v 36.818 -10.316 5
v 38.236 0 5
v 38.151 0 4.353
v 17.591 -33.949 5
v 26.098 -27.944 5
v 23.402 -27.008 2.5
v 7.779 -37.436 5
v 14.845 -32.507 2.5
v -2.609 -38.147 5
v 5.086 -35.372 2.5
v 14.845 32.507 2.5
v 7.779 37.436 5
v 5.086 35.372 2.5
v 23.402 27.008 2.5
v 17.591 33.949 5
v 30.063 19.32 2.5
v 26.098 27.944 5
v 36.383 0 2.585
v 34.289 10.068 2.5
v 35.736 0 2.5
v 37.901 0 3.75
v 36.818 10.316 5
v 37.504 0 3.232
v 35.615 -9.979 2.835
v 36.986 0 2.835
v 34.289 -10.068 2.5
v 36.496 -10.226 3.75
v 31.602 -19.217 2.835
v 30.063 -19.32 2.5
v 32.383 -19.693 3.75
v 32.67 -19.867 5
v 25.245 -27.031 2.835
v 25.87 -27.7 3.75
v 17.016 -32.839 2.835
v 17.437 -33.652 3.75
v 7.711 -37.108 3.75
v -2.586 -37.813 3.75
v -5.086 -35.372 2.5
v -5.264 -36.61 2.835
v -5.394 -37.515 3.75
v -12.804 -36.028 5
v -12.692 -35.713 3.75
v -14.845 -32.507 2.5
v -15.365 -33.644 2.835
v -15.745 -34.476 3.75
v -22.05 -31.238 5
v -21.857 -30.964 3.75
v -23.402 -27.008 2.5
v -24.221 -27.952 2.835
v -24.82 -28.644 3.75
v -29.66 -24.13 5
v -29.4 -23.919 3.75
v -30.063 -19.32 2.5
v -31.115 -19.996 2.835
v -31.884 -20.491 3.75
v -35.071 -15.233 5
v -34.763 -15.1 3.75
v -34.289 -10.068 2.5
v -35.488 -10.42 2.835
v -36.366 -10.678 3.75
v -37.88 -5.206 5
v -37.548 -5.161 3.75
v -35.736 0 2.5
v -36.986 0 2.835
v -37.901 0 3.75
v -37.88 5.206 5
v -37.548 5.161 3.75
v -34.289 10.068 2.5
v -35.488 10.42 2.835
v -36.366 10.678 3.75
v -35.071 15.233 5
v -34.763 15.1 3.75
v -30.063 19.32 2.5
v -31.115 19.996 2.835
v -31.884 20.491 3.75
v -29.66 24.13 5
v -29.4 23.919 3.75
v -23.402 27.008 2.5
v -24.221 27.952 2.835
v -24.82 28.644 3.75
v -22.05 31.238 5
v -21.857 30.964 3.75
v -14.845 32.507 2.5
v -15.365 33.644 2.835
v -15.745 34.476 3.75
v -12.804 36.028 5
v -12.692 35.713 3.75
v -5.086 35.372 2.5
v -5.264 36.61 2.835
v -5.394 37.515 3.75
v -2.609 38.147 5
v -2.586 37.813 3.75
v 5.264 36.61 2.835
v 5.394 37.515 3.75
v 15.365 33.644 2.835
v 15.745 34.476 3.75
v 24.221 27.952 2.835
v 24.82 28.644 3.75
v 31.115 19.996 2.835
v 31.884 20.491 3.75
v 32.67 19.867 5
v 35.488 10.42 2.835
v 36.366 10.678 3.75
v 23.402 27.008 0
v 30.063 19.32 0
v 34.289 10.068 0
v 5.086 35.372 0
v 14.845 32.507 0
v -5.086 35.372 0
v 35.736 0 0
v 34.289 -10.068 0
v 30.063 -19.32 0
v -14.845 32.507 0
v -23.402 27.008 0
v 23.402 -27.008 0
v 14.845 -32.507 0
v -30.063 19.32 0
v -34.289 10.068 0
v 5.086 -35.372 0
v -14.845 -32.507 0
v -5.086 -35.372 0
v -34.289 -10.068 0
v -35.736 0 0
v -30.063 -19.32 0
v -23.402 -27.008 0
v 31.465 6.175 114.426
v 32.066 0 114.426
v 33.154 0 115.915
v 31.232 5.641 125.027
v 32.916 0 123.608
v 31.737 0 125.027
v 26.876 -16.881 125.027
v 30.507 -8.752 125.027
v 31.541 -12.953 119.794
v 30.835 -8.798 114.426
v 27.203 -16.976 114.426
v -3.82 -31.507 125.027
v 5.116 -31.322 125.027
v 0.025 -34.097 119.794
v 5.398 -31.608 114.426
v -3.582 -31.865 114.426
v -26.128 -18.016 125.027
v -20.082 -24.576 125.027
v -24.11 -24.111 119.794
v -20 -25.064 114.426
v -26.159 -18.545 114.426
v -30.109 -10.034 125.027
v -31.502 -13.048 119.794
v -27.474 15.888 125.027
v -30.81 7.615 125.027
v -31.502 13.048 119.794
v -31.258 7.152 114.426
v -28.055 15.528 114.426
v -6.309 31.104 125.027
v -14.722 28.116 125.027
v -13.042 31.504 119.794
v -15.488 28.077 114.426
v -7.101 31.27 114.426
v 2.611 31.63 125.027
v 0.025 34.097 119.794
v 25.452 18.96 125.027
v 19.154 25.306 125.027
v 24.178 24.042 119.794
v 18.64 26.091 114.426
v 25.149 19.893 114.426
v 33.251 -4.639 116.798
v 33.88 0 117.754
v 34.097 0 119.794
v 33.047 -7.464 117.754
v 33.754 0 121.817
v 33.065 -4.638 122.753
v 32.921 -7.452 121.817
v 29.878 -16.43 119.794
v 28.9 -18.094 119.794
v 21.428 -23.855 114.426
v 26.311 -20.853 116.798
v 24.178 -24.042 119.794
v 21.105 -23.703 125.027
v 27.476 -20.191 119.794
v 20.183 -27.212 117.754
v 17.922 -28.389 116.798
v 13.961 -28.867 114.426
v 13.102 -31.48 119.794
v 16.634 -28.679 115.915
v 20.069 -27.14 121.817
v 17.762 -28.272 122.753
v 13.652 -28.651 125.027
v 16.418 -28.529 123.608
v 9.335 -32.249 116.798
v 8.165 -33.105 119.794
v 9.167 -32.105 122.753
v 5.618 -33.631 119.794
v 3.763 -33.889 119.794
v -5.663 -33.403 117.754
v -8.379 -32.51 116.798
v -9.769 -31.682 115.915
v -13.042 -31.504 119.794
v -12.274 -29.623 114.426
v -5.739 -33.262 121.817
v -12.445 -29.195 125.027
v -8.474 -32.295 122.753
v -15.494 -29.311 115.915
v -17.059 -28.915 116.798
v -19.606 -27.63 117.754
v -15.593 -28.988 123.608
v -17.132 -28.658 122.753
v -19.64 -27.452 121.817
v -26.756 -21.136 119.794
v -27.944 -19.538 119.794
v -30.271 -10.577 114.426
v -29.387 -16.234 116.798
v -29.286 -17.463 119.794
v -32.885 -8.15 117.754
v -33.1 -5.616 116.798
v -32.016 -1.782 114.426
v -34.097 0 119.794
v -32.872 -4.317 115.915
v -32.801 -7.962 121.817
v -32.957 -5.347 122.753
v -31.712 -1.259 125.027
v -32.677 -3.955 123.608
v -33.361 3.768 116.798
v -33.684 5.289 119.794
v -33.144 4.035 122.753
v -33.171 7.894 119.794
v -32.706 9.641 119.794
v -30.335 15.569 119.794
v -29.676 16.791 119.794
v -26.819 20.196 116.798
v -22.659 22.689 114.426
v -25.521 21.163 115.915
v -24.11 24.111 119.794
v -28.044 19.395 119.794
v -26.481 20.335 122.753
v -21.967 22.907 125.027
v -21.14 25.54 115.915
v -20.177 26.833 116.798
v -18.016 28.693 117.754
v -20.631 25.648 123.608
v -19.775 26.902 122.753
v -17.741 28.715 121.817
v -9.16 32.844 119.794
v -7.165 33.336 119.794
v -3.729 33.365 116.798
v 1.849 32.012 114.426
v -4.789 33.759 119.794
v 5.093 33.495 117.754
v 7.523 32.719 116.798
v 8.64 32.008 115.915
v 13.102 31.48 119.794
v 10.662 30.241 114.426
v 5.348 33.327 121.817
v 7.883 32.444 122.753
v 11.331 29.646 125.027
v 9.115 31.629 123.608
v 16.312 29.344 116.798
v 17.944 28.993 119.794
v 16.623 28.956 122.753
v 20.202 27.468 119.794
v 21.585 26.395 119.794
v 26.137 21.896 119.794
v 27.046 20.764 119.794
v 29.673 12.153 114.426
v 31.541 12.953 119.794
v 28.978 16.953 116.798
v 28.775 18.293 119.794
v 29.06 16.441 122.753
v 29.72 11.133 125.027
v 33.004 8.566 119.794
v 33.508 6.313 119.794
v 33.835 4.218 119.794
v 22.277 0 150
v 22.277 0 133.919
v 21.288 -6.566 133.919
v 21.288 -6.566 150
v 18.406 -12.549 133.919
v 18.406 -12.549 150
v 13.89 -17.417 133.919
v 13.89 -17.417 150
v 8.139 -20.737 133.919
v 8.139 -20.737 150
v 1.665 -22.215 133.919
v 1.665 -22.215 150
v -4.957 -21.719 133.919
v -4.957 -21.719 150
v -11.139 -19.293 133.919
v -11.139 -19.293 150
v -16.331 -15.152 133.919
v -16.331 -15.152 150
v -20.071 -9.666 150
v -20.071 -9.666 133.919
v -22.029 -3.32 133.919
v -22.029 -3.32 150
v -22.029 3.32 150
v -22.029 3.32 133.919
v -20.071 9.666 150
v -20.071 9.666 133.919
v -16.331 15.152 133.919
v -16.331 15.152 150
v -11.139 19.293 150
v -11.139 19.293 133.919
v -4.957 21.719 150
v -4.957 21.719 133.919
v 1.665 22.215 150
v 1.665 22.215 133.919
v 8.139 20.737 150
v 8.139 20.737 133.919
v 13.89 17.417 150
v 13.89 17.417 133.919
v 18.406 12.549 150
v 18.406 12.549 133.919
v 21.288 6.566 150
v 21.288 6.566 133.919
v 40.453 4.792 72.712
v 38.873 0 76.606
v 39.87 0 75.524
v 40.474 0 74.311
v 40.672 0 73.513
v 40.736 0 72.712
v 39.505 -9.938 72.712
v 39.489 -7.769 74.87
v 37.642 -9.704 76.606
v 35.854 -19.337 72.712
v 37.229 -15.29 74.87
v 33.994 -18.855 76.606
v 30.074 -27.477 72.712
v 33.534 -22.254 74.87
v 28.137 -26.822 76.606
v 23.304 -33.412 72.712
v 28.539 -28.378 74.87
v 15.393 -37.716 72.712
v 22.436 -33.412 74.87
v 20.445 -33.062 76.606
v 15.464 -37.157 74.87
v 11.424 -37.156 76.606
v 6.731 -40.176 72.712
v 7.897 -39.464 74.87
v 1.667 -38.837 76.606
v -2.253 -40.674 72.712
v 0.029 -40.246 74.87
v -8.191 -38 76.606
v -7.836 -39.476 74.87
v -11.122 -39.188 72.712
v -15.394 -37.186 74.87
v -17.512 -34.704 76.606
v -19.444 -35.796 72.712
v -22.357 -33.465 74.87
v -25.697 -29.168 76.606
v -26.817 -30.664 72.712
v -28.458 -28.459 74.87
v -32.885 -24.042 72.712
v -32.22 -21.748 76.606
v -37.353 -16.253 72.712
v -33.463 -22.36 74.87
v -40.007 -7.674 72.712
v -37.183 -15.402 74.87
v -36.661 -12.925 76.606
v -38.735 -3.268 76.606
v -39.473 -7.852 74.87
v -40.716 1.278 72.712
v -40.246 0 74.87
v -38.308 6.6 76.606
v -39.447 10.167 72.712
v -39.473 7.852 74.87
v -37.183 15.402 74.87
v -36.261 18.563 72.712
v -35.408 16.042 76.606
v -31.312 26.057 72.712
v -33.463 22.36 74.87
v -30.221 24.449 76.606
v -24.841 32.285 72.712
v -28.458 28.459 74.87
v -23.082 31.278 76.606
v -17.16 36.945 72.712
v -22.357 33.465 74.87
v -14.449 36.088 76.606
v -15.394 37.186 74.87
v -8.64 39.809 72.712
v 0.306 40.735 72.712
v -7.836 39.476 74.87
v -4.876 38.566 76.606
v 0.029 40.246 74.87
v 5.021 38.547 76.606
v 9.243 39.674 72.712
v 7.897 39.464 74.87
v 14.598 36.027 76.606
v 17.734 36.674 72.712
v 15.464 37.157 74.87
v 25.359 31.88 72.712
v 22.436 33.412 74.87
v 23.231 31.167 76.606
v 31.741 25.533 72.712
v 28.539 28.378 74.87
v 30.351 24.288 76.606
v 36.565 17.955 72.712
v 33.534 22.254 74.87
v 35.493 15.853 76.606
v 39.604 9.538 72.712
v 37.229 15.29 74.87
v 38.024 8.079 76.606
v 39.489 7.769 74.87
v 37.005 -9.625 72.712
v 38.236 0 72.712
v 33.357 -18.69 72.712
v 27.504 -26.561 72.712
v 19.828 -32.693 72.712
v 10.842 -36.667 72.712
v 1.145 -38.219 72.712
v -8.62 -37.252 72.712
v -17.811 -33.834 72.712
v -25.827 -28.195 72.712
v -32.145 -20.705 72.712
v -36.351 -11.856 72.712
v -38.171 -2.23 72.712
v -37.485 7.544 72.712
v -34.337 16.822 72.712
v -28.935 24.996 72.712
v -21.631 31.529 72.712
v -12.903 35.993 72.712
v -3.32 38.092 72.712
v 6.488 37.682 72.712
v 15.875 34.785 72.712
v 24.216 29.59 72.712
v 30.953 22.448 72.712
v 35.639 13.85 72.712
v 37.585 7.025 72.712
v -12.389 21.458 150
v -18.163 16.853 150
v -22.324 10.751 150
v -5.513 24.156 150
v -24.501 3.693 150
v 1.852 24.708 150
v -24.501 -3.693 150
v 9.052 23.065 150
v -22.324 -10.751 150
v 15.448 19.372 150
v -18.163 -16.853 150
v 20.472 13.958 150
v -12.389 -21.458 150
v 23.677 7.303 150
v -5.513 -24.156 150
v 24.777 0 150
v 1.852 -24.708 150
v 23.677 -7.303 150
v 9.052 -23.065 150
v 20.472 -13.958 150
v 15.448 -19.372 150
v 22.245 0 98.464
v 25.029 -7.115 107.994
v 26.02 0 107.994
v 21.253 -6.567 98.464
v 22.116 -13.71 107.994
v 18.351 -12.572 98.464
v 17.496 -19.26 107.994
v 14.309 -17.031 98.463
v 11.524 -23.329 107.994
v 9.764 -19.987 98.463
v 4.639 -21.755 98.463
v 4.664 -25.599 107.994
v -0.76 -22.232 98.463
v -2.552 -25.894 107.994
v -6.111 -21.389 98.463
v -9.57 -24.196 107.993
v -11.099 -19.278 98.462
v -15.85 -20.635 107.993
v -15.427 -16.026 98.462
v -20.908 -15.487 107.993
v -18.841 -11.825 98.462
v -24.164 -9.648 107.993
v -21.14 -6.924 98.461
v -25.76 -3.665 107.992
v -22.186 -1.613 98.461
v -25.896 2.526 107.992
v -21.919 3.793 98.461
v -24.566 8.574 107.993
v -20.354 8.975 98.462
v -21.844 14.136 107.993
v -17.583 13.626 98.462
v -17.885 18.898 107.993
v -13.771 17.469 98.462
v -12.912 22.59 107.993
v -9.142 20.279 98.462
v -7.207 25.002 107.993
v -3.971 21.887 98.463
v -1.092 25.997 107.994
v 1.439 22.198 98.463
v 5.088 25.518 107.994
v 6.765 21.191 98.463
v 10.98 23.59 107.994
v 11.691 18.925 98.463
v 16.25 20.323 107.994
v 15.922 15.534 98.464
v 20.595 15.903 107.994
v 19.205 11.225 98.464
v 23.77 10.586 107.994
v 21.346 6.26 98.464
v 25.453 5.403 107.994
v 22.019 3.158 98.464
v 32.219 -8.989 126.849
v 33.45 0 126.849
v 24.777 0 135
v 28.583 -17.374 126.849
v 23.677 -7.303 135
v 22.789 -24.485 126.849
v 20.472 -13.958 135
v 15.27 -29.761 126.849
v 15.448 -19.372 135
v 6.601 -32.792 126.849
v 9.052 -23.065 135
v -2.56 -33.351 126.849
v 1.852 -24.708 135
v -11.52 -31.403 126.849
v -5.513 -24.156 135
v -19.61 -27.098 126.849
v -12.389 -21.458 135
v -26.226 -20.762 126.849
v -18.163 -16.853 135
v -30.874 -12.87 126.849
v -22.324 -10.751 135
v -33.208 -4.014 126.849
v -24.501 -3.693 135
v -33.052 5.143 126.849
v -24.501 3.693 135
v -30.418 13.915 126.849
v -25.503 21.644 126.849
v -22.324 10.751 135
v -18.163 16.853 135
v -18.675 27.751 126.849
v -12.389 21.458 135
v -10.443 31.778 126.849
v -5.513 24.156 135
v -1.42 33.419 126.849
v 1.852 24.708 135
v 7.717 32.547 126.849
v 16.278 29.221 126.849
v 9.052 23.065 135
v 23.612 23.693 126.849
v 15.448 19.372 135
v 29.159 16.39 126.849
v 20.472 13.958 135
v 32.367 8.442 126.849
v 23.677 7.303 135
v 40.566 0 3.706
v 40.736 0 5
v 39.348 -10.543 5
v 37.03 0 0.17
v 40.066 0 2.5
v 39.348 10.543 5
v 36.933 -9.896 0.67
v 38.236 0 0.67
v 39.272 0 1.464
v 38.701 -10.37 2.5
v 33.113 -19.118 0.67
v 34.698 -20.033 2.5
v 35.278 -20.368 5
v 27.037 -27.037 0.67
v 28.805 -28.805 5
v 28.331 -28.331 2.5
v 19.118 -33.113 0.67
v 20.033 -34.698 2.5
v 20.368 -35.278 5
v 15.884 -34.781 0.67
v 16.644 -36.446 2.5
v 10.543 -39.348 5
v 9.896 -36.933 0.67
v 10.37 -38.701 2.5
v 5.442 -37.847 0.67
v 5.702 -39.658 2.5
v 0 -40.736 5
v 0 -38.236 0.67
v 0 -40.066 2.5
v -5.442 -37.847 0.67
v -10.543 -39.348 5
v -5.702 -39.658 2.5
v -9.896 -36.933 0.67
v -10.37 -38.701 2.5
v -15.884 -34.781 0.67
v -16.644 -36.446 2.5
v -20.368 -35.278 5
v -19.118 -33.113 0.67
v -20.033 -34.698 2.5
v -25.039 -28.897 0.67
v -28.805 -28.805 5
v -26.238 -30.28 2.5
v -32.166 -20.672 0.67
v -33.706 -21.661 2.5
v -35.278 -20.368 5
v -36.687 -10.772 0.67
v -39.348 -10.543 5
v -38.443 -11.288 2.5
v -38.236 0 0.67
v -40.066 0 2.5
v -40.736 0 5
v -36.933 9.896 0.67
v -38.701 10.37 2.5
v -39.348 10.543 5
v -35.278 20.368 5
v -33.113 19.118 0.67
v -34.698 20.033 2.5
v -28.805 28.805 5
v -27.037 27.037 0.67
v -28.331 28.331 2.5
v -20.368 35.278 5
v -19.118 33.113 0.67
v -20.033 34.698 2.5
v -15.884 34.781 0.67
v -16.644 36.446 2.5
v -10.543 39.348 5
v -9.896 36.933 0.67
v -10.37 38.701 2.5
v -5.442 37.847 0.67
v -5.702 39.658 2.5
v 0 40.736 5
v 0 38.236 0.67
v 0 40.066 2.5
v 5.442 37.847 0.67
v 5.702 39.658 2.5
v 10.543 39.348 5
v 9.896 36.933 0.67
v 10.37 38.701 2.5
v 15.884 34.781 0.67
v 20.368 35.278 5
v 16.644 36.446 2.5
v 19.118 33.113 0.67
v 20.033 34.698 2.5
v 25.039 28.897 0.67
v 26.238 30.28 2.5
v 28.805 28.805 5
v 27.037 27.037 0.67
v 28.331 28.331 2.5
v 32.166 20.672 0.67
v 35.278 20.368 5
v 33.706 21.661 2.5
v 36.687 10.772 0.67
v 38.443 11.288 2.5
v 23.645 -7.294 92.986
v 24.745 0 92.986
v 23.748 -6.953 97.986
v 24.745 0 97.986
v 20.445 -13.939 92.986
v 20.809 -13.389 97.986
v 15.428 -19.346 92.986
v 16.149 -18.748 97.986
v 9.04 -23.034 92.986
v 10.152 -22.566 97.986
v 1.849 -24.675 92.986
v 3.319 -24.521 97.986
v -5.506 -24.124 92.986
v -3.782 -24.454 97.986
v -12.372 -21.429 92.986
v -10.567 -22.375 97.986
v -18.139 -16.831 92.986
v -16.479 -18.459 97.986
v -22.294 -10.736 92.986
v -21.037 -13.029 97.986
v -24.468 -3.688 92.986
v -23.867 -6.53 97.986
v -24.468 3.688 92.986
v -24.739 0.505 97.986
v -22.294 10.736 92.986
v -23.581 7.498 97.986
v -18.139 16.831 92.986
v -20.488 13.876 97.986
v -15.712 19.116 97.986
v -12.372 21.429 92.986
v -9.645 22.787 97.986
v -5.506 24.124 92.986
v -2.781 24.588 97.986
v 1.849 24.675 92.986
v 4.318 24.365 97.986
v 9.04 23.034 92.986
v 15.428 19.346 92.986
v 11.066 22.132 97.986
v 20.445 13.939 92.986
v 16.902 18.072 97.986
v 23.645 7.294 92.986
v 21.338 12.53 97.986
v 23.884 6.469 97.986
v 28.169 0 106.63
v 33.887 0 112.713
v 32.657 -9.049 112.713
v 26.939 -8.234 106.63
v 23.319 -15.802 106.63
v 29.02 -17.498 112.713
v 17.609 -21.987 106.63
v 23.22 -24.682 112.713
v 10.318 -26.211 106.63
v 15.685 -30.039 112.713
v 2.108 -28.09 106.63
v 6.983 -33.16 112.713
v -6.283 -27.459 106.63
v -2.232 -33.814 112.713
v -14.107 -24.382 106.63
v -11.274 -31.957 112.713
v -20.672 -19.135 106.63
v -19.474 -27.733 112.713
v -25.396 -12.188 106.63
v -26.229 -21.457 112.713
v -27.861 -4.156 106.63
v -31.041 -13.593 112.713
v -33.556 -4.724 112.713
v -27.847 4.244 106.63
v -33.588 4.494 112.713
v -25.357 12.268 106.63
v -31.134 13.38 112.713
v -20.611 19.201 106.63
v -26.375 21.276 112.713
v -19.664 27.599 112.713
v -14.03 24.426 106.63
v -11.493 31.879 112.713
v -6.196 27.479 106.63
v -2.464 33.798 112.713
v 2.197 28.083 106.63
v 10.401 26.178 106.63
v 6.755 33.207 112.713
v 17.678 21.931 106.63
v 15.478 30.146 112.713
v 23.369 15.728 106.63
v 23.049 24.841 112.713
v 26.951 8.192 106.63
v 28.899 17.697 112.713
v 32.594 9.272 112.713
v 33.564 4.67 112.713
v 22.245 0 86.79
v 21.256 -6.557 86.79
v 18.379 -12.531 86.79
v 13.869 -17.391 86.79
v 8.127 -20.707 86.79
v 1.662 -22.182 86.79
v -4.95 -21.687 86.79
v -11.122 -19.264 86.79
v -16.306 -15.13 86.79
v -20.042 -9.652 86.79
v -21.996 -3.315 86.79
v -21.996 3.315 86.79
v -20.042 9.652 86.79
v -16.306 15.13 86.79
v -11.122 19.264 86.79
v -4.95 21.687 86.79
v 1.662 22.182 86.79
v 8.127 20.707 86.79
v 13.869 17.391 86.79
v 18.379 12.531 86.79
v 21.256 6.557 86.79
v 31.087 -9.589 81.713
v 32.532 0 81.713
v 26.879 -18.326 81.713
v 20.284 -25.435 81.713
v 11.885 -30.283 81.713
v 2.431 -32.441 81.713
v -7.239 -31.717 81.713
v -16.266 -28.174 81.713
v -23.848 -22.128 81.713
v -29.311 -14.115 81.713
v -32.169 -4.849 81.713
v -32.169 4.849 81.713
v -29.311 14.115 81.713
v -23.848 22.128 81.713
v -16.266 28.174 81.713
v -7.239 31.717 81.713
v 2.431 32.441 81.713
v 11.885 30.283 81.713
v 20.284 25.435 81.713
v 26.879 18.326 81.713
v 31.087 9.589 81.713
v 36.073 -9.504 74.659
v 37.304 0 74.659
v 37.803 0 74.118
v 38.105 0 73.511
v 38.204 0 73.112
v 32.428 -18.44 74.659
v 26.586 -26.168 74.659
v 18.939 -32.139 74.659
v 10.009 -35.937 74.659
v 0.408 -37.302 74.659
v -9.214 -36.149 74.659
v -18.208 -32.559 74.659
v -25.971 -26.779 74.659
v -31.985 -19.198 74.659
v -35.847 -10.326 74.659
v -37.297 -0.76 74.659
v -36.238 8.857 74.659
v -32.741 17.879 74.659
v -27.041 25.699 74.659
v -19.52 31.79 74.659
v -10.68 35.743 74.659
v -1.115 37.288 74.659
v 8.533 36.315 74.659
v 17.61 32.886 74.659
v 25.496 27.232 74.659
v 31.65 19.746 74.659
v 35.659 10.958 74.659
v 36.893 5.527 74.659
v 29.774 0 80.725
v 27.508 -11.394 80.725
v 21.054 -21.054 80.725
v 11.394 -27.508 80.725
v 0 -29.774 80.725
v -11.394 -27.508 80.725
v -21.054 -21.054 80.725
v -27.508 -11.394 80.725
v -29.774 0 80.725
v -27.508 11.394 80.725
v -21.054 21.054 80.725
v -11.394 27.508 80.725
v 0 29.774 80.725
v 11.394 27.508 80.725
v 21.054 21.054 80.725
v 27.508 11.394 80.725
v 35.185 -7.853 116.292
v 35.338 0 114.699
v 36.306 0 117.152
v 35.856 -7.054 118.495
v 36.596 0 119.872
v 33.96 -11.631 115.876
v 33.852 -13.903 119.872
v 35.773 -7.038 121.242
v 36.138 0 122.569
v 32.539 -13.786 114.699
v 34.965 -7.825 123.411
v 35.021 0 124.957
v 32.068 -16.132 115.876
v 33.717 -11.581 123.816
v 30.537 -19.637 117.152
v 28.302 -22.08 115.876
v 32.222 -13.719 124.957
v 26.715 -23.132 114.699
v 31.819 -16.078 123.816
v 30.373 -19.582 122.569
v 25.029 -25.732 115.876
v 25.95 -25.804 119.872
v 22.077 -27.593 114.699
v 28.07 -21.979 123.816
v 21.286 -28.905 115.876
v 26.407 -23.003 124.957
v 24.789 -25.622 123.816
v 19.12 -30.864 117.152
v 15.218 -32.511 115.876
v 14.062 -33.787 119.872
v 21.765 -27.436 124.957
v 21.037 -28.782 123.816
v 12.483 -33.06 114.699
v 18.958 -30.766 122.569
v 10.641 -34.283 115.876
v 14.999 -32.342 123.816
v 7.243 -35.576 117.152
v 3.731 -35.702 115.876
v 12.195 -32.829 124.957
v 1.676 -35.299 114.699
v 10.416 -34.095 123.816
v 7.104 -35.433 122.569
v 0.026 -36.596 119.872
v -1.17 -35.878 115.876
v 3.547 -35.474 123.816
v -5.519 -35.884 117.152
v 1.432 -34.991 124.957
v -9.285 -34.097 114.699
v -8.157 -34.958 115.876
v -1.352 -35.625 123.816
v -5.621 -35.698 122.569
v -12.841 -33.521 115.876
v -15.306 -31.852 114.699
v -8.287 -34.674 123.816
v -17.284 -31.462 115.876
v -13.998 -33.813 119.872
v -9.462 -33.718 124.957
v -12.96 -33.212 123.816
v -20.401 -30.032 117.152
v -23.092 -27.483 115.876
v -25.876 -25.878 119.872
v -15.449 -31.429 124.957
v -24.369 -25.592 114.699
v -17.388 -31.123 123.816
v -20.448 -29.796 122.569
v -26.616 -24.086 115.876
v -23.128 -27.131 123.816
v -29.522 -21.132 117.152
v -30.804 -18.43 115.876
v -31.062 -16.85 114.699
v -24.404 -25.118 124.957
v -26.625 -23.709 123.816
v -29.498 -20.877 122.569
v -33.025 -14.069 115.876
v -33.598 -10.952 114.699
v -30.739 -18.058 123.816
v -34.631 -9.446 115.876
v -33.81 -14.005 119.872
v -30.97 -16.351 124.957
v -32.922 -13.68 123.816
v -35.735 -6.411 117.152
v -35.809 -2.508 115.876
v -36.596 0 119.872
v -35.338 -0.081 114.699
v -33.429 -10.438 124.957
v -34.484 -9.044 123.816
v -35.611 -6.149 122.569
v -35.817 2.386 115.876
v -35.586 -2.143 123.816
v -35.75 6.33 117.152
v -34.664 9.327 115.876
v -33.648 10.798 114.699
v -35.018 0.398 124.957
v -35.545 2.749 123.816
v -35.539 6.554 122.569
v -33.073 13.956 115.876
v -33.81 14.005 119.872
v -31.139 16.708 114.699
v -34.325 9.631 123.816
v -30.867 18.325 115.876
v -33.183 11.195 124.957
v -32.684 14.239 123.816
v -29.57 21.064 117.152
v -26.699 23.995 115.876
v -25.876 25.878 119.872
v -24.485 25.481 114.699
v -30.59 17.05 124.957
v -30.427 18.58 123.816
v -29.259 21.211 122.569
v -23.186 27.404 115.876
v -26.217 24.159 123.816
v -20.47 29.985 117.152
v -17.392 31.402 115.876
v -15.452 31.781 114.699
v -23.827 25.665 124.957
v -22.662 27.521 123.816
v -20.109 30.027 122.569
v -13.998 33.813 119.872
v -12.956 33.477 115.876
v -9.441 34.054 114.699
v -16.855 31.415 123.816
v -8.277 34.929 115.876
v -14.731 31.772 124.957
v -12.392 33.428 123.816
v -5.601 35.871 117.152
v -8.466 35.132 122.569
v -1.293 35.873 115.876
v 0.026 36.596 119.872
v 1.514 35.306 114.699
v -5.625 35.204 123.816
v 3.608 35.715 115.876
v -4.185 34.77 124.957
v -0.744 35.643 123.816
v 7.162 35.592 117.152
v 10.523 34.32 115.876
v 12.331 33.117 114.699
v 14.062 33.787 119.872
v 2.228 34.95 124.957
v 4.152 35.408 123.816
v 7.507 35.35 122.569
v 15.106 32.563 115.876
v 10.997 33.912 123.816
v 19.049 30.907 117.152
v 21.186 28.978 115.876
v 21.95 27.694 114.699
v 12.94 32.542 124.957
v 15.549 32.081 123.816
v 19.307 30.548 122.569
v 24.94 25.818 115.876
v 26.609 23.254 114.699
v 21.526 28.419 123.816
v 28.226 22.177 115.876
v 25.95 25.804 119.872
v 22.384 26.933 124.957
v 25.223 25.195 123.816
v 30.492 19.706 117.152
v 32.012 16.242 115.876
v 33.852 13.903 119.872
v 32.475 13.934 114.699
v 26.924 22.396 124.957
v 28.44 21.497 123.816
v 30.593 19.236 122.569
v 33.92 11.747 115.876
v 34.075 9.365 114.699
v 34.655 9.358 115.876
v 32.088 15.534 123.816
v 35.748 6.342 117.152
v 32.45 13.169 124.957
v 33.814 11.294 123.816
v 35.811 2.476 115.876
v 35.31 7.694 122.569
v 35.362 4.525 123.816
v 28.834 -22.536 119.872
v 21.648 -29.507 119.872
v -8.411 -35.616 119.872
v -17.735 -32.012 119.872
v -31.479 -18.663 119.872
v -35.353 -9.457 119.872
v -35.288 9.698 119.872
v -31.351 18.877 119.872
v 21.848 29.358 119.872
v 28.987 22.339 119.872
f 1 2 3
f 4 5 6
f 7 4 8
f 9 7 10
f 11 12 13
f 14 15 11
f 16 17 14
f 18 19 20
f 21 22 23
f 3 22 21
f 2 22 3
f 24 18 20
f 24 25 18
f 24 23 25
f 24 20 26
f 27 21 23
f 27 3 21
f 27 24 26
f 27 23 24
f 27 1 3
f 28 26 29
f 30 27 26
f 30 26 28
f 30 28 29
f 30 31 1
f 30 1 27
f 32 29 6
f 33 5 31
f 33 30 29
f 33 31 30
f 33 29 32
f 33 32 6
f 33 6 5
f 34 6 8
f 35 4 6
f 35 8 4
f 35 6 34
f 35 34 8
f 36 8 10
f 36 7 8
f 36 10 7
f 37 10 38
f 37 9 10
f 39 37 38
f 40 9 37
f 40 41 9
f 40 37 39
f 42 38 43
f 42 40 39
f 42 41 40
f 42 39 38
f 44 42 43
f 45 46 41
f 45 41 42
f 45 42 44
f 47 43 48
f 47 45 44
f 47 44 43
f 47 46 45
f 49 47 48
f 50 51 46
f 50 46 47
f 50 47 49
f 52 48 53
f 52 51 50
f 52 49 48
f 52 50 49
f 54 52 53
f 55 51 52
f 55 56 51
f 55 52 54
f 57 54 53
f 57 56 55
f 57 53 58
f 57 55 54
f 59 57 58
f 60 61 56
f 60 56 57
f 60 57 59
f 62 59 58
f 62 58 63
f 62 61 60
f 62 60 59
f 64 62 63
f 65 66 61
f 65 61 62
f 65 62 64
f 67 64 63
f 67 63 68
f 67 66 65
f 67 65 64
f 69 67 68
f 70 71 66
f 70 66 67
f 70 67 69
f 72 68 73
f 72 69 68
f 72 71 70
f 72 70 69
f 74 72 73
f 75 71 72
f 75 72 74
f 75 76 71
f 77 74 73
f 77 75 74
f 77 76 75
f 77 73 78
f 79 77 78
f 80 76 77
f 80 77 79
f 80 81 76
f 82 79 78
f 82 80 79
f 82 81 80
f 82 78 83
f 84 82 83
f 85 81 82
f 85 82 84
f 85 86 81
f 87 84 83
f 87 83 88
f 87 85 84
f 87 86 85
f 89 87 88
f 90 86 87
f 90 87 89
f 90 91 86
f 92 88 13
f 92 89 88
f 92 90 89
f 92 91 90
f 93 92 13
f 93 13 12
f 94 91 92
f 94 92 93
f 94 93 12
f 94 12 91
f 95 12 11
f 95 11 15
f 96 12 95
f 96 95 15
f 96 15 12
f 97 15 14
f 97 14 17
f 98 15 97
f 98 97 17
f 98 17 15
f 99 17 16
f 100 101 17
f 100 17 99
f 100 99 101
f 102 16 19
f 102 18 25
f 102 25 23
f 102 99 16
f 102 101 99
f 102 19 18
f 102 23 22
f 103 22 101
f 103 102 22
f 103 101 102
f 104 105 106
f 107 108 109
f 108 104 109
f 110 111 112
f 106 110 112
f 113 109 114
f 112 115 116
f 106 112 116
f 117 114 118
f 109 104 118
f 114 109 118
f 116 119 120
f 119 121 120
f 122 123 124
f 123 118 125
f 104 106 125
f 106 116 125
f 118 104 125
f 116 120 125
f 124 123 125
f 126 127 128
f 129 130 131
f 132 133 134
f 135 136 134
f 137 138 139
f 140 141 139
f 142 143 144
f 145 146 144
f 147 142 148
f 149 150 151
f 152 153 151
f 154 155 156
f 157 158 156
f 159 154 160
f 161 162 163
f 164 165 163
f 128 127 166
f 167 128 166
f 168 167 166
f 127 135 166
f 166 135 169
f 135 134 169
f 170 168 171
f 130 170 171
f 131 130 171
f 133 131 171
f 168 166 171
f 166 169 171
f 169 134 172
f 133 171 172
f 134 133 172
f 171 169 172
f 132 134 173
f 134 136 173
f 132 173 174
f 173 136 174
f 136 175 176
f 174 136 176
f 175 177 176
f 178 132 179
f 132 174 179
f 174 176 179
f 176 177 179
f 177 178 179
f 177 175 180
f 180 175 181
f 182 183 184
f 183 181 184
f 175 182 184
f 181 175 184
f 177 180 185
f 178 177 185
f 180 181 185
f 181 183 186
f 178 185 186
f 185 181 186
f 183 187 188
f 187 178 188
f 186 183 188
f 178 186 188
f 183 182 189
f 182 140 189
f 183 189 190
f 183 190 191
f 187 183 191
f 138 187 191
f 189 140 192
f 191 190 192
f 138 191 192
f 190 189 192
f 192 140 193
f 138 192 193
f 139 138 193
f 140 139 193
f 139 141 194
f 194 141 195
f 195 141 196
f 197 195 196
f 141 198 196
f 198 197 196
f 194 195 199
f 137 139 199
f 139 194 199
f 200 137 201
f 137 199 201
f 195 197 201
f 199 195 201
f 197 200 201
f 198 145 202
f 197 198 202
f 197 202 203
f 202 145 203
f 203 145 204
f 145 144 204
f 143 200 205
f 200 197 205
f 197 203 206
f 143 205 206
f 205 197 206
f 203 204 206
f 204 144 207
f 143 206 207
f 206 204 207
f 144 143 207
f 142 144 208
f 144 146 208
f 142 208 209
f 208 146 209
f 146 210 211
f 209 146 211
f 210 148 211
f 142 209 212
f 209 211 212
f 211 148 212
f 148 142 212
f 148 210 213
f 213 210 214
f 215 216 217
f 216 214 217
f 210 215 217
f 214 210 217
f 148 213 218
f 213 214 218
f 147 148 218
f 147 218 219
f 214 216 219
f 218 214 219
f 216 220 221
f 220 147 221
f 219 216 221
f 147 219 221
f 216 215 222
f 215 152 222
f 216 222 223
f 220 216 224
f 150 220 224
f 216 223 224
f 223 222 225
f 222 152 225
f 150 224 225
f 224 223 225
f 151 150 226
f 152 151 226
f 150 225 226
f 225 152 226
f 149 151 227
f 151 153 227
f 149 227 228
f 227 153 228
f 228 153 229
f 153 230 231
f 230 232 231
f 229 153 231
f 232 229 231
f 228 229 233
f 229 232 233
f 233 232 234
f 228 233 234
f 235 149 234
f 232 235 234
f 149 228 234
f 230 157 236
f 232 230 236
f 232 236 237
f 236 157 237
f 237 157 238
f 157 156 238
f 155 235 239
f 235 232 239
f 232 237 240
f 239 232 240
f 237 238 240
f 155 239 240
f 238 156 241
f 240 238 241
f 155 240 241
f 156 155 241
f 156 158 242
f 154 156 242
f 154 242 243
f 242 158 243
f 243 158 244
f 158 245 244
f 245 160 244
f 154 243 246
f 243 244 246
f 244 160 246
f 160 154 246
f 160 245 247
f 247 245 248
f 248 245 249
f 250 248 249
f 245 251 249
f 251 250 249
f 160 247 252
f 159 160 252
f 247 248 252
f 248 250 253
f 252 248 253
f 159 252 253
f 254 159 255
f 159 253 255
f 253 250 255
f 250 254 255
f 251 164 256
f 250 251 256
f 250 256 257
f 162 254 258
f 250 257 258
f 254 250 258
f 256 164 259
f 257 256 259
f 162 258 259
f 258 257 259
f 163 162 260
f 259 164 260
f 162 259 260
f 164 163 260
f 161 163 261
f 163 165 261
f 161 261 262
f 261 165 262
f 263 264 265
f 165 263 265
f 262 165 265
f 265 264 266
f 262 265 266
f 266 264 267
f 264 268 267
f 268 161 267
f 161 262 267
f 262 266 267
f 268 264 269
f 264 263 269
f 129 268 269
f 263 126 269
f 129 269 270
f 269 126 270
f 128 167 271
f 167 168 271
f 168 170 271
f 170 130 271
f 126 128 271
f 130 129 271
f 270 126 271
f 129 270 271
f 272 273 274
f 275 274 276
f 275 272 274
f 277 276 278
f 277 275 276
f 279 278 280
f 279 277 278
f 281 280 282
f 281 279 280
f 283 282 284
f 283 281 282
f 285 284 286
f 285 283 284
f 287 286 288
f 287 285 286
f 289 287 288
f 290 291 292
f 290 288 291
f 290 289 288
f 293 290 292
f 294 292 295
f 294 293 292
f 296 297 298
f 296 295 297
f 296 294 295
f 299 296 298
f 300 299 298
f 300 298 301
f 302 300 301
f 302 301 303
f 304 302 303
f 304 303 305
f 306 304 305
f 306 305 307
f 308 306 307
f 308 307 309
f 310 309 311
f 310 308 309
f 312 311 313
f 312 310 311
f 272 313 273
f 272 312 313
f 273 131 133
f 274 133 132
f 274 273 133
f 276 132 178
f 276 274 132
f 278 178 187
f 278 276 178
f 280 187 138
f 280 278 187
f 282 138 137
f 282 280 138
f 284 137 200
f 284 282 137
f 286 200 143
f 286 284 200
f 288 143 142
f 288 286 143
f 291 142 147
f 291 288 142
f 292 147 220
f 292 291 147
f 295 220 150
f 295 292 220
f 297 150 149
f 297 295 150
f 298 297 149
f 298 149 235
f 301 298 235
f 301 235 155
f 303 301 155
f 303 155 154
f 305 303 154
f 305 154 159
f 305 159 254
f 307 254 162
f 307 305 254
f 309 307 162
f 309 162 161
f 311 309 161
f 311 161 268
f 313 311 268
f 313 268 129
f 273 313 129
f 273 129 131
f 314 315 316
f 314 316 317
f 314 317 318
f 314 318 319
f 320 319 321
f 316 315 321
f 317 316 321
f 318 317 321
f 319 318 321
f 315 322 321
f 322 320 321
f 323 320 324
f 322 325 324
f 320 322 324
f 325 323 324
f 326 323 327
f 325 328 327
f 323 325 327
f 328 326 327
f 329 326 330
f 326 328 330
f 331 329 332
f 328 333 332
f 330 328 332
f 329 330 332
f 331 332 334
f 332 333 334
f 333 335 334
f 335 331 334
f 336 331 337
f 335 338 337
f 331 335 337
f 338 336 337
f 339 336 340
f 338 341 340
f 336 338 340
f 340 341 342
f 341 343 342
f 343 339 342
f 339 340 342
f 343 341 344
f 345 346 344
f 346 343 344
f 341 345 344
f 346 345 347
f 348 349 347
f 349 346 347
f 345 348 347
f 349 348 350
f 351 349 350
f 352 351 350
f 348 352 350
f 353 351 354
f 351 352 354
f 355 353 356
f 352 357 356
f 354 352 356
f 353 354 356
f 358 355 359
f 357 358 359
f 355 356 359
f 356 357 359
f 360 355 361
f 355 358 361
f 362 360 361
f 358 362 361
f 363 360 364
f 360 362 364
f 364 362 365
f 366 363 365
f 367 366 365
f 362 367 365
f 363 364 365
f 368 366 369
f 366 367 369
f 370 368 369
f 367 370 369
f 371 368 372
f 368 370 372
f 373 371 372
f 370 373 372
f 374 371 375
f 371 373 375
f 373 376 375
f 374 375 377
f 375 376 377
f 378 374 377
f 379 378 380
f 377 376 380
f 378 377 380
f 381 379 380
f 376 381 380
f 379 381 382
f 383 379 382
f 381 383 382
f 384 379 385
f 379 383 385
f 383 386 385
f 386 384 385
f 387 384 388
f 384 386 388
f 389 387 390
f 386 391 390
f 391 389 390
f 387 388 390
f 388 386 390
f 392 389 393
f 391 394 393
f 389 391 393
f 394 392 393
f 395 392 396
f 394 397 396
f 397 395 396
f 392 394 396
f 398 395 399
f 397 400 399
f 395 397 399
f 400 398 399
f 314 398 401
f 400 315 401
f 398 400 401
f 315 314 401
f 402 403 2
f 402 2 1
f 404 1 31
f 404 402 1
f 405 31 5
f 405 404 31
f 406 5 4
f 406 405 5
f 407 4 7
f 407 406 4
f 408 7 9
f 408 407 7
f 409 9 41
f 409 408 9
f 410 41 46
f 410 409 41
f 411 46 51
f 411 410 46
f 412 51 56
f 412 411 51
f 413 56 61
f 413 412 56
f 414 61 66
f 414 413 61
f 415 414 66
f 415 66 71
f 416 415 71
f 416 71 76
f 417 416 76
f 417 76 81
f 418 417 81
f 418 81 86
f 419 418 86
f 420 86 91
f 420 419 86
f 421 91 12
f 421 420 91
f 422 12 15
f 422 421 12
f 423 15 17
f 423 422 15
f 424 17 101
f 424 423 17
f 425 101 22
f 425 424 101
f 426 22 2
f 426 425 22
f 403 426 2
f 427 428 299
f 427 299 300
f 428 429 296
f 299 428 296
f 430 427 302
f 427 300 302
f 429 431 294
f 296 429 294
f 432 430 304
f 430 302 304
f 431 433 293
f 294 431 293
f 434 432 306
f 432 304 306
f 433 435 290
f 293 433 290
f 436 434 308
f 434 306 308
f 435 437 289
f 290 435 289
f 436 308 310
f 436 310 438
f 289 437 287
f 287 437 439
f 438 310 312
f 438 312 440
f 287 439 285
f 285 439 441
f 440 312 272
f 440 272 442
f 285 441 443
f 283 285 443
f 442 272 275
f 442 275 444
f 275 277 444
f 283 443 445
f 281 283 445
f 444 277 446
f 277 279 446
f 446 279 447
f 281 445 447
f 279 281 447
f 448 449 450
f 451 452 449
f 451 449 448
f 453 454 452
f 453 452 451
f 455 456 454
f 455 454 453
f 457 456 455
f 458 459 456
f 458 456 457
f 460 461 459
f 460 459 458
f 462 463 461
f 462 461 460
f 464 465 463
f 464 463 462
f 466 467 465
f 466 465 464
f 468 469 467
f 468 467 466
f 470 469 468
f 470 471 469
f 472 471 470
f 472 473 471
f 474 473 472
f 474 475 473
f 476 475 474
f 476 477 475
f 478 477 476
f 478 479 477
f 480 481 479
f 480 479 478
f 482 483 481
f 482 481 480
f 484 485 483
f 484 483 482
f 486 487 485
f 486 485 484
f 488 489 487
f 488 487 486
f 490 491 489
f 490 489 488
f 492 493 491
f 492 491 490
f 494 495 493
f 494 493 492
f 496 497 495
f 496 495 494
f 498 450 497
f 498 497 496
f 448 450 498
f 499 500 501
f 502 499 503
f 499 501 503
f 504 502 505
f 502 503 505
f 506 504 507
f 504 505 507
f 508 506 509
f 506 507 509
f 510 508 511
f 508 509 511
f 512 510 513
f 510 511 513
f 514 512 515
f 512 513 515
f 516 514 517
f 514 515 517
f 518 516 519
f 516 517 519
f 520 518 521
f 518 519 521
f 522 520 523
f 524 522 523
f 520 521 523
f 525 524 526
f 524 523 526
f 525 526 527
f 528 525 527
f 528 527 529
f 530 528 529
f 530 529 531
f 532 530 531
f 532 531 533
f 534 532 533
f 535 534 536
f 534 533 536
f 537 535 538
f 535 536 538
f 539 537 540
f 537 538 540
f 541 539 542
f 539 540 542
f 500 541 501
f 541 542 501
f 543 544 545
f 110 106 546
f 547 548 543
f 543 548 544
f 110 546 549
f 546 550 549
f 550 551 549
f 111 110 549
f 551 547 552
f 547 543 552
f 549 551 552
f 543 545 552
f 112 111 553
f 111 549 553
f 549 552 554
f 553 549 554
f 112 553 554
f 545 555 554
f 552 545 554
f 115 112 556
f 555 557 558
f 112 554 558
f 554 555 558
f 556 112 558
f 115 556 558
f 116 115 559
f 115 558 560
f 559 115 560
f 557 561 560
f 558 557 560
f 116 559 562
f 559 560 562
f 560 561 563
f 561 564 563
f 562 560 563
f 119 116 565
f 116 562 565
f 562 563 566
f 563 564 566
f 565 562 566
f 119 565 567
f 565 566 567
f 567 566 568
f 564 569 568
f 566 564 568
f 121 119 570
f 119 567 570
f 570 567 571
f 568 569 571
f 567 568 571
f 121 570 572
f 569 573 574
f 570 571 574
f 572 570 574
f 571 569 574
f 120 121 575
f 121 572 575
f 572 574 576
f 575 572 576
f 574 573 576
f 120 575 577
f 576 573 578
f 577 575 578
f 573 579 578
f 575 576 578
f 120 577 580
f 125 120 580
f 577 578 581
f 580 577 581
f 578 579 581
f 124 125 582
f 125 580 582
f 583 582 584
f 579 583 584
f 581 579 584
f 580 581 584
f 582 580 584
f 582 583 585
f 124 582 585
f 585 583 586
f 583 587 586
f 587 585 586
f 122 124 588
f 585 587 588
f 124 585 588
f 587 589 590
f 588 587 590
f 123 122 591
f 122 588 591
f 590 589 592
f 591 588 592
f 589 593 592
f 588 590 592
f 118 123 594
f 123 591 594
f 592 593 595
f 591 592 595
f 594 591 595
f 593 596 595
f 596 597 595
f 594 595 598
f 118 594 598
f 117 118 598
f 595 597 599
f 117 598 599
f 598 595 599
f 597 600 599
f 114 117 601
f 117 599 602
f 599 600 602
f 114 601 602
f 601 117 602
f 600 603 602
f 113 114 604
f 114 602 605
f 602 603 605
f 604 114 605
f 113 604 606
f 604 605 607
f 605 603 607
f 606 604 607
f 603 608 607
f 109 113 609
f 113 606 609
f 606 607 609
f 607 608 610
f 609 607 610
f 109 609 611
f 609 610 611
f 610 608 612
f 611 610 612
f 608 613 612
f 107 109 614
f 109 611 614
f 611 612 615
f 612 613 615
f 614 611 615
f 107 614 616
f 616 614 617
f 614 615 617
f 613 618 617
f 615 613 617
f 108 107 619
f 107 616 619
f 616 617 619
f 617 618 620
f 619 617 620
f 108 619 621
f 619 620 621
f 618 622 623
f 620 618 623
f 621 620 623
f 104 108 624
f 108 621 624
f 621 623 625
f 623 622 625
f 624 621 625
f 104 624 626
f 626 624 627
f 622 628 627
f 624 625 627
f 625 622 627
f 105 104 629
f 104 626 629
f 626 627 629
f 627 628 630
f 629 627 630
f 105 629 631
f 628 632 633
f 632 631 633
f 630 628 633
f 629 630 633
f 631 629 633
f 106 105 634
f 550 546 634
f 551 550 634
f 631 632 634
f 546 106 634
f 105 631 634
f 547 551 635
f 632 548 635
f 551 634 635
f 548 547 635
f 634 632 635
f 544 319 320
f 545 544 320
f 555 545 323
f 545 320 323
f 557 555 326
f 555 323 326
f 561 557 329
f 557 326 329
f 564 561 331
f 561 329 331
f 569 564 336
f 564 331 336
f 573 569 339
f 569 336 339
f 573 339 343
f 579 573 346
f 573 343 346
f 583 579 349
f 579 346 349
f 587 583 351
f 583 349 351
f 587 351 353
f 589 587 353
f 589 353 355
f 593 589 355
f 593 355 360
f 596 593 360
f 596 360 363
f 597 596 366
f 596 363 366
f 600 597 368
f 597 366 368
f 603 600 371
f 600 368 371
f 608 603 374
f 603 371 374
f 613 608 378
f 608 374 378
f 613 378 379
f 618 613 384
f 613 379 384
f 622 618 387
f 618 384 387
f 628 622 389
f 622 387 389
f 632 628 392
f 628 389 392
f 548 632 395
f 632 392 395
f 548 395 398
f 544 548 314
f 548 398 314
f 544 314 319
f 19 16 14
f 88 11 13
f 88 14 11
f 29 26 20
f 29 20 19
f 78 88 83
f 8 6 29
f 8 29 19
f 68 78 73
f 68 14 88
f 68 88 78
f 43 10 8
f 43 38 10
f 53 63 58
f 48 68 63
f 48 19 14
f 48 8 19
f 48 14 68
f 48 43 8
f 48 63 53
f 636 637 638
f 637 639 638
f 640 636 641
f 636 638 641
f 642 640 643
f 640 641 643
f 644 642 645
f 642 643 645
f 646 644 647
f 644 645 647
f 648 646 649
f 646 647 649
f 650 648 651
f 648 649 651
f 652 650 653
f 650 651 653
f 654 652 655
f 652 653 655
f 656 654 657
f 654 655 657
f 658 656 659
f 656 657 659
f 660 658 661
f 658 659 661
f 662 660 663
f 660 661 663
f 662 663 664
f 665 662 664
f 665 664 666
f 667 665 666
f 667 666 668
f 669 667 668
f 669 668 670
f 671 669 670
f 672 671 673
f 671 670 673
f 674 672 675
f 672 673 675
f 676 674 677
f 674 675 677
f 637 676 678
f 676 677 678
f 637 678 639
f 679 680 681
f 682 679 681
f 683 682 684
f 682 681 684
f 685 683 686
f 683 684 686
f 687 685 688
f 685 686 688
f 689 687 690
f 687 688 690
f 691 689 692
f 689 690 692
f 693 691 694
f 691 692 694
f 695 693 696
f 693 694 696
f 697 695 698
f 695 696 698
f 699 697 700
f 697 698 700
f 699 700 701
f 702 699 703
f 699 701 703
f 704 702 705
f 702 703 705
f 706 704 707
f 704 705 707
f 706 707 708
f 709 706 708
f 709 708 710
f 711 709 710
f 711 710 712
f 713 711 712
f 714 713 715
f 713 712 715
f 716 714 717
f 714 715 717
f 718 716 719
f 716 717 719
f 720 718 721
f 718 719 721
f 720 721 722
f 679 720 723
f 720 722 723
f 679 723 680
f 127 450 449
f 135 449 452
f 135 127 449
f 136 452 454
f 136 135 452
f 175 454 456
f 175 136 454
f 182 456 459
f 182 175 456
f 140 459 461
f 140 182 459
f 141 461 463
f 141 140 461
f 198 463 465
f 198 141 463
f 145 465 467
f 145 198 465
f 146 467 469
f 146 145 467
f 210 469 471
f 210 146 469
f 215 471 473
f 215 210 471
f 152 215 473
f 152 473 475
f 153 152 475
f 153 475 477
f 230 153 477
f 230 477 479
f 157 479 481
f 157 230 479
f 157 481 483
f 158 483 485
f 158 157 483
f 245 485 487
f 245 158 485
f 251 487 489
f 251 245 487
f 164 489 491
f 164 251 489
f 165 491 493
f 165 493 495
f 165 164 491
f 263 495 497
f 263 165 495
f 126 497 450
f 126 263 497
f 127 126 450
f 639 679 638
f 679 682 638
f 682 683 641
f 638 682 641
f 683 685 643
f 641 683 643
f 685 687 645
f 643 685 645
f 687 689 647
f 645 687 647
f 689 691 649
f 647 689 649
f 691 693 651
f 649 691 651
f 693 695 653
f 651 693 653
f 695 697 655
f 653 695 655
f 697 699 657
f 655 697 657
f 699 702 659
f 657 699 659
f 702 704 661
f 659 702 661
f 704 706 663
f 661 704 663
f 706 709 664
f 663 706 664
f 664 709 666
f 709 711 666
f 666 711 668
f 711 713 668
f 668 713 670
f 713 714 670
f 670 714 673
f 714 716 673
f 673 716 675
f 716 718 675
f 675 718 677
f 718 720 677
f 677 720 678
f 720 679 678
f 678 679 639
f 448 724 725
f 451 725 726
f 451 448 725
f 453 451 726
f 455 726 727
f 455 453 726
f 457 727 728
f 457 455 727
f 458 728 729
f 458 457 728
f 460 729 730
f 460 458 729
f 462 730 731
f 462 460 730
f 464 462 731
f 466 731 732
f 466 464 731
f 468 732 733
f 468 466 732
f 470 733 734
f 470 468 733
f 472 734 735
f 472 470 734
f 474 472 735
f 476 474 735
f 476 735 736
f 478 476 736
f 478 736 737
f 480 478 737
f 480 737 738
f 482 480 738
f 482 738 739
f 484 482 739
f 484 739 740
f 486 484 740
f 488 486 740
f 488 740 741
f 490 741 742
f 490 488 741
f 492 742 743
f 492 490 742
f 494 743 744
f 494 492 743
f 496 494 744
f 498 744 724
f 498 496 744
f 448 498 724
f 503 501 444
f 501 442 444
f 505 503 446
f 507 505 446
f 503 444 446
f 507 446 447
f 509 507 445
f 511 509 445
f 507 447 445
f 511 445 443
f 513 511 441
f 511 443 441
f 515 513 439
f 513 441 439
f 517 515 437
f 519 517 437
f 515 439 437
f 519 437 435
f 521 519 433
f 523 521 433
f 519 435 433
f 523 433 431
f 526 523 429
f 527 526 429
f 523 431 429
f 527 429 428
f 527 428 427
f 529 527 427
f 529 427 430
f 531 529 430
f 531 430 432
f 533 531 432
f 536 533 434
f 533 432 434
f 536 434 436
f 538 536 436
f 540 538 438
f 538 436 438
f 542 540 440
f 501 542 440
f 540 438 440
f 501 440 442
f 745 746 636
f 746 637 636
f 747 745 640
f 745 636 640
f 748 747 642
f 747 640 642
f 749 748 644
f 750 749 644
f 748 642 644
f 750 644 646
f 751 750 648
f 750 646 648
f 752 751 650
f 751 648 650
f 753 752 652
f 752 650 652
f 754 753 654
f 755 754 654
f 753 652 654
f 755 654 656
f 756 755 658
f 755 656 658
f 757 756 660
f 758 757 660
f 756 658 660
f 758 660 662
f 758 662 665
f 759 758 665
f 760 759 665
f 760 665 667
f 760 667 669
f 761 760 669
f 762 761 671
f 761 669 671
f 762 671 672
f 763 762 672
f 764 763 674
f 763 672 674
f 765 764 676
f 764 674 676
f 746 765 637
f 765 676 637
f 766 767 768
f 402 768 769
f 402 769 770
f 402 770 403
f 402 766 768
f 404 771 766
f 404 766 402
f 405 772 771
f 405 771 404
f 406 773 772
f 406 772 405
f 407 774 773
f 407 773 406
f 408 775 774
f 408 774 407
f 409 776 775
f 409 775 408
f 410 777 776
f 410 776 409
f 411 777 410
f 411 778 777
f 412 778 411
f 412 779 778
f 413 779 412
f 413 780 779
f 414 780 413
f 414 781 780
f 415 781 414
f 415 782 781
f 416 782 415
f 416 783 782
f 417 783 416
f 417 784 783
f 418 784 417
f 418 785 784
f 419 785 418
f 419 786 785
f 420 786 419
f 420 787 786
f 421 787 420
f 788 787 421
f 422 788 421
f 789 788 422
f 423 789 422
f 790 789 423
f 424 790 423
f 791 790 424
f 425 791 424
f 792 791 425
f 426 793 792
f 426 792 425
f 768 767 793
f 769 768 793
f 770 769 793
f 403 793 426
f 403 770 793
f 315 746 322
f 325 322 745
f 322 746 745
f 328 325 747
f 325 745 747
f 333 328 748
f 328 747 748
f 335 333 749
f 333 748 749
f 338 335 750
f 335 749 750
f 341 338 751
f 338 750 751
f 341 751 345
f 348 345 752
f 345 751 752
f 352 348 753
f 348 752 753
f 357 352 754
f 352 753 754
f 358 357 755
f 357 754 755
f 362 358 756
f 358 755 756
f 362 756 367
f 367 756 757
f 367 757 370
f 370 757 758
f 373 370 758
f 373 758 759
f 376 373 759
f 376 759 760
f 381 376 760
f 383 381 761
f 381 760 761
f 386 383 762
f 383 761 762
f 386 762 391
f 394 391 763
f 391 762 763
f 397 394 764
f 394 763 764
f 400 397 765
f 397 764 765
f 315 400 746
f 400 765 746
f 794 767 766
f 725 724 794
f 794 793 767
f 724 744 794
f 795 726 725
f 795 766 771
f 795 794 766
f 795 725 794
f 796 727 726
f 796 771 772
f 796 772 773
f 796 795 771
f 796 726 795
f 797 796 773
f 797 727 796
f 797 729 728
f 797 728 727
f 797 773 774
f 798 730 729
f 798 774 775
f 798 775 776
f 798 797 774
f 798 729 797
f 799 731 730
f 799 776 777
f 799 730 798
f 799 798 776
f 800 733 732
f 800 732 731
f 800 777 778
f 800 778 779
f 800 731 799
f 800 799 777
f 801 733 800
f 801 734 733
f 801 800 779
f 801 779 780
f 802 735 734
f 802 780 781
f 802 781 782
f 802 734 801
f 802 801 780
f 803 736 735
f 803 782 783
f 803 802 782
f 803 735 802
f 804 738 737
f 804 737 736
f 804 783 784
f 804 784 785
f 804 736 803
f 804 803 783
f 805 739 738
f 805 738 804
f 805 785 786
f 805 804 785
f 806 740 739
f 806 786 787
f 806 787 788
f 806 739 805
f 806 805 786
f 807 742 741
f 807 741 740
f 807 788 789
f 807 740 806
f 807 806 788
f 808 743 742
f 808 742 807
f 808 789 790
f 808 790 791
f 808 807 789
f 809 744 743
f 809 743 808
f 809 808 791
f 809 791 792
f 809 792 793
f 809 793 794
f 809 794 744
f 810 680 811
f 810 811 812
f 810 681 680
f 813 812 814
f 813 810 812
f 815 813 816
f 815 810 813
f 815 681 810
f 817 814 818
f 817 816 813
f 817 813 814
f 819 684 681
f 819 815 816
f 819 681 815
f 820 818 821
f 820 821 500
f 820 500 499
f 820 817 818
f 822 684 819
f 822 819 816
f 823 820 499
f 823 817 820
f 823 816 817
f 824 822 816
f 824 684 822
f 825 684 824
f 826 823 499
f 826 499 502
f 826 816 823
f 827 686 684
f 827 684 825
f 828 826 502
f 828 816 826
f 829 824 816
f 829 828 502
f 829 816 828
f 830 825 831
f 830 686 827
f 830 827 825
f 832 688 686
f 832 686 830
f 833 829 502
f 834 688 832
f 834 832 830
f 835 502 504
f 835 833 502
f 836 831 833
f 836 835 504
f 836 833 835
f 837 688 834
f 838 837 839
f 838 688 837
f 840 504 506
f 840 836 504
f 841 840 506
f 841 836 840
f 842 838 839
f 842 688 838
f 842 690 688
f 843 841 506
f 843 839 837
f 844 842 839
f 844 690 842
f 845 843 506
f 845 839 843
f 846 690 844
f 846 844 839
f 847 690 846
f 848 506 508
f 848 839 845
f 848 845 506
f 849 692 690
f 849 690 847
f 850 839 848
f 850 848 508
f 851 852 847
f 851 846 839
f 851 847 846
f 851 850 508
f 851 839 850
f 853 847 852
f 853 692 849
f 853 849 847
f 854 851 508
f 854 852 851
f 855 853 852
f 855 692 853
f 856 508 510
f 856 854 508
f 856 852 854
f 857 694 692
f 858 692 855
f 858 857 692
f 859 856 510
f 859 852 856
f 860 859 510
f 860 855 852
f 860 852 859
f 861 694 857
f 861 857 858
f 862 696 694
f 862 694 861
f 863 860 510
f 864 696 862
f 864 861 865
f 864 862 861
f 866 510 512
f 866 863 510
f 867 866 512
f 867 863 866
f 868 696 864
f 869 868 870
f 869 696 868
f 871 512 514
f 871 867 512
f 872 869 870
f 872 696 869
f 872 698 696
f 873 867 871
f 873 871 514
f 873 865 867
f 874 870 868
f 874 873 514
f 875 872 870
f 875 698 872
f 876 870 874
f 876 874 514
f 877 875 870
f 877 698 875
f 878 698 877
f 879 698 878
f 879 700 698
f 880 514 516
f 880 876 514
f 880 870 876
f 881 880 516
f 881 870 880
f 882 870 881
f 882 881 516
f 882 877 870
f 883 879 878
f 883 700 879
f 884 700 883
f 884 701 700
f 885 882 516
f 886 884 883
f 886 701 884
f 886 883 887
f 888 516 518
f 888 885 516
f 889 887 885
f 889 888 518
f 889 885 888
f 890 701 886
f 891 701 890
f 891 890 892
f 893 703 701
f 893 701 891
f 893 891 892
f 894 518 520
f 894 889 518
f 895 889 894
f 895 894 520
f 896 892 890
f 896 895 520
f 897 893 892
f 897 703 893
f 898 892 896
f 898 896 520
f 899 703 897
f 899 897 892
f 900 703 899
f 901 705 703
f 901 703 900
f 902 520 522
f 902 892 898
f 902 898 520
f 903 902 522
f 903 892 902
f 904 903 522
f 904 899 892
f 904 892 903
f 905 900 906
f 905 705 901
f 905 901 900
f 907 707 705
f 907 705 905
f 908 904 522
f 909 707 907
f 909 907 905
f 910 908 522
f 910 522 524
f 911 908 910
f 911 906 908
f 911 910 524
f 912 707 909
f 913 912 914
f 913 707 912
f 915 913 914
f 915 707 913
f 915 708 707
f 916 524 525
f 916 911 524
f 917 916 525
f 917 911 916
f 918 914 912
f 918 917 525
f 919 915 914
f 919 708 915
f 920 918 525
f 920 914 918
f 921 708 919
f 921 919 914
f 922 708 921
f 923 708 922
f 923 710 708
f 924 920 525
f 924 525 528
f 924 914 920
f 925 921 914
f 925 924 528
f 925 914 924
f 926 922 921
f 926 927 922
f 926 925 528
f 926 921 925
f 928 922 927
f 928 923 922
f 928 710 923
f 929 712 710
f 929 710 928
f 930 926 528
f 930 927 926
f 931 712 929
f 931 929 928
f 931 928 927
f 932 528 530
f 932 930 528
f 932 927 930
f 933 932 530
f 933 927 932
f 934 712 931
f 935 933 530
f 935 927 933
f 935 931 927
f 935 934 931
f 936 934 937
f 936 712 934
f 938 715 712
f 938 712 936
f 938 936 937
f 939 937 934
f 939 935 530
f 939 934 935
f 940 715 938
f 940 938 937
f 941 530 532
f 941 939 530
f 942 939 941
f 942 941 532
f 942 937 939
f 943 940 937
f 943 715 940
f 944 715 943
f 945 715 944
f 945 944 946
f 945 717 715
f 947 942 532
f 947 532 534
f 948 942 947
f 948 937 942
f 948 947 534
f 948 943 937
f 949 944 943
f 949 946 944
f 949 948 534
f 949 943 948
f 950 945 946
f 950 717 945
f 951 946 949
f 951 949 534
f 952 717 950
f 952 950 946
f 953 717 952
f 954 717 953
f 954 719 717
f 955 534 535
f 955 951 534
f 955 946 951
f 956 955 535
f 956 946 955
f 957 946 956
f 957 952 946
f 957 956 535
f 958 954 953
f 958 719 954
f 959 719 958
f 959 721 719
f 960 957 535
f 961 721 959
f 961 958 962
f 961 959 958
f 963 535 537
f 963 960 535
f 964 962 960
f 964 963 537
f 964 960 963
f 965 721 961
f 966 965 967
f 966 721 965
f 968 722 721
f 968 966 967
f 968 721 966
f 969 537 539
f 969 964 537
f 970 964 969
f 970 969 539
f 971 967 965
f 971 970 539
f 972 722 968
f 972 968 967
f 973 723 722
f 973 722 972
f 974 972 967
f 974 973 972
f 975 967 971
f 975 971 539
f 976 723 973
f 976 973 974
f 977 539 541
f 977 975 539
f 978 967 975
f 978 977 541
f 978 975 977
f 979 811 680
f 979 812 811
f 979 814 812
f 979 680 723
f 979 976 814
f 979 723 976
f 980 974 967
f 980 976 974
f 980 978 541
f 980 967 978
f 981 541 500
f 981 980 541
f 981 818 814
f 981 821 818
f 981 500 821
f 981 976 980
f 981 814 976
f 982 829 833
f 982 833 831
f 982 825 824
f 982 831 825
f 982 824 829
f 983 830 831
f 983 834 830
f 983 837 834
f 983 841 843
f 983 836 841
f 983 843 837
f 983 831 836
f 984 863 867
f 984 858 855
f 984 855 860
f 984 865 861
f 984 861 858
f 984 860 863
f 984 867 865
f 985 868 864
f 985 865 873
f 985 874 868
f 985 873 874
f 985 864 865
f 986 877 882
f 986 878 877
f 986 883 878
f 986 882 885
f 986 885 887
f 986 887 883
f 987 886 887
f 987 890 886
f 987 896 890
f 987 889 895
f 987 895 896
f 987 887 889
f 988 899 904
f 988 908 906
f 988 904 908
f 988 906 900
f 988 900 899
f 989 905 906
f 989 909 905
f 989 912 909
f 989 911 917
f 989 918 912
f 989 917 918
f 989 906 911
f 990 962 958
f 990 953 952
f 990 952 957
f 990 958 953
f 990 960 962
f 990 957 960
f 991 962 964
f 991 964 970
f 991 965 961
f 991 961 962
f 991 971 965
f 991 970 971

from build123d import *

# Parameters (mm, degrees)
F2_R    = 5
F3_R    = 10
F4_SIZE = 5
F5_R    = 5
F6_T    = -2.5


# Not quite as in the source:
# - a fillet or chamfer that OpenCascade refuses, or shapes differently, is made with other operations: its cross-section is extruded or revolved along the edge and cut away or added


with BuildPart() as f1:
    # F0 (on Front) → F1 (revolve)
    with BuildSketch(Plane.XZ):
        Polygon((0, 150), (0, 0), (40.7360860733, 0), (40.7360860733, 75.1049241643), (24.7445367592, 87.9864128578), (24.7445367592, 102.9864128578), (40.7360860733, 120), (24.7774192725, 135), (24.7774192725, 150), align=None)
    revolve(axis=Axis((0, 0, 75), (0, 0, -1)))

    # F2
    f2_edges = [f1.edges().sort_by_distance(p)[0] for p in [
        (-40.736086, 0, 0),
    ]]
    fillet(f2_edges, radius=F2_R)

    # F3
    f3_edges = [f1.edges().sort_by_distance(p)[0] for p in [
        (-40.736086, 0, 120),
    ]]
    fillet(f3_edges, radius=F3_R)

    # F4
    f4_edges = [f1.edges().sort_by_distance(p)[0] for p in [
        (-24.744537, 0, 102.986413),
    ]]
    chamfer(f4_edges, length=F4_SIZE)

    # F5
    f5_edges = [f1.edges().sort_by_distance(p)[0] for p in [
        (-40.736086, 0, 75.104924),
    ]]
    fillet(f5_edges, radius=F5_R)

    # F6
    f6_openings = [f1.faces().sort_by_distance(p)[0] for p in [
        (0, 0, 150),
    ]]
    offset(amount=F6_T, openings=f6_openings, kind=Kind.INTERSECTION)

    # F7: chamfer of 5 x 10 on 1 edges, made by hand

    # F7_s1 → F7_t2 (revolve)
    with BuildSketch(Plane.XZ):
        Polygon((32.5322168572, 81.7132925265), (24.7445367592, 92.9864128578), (24.7445367592, 87.9864128578), align=None)
    revolve(axis=Axis((0, 0, 87.9864128578), (0, 0, -1)))


solid = f1.part
